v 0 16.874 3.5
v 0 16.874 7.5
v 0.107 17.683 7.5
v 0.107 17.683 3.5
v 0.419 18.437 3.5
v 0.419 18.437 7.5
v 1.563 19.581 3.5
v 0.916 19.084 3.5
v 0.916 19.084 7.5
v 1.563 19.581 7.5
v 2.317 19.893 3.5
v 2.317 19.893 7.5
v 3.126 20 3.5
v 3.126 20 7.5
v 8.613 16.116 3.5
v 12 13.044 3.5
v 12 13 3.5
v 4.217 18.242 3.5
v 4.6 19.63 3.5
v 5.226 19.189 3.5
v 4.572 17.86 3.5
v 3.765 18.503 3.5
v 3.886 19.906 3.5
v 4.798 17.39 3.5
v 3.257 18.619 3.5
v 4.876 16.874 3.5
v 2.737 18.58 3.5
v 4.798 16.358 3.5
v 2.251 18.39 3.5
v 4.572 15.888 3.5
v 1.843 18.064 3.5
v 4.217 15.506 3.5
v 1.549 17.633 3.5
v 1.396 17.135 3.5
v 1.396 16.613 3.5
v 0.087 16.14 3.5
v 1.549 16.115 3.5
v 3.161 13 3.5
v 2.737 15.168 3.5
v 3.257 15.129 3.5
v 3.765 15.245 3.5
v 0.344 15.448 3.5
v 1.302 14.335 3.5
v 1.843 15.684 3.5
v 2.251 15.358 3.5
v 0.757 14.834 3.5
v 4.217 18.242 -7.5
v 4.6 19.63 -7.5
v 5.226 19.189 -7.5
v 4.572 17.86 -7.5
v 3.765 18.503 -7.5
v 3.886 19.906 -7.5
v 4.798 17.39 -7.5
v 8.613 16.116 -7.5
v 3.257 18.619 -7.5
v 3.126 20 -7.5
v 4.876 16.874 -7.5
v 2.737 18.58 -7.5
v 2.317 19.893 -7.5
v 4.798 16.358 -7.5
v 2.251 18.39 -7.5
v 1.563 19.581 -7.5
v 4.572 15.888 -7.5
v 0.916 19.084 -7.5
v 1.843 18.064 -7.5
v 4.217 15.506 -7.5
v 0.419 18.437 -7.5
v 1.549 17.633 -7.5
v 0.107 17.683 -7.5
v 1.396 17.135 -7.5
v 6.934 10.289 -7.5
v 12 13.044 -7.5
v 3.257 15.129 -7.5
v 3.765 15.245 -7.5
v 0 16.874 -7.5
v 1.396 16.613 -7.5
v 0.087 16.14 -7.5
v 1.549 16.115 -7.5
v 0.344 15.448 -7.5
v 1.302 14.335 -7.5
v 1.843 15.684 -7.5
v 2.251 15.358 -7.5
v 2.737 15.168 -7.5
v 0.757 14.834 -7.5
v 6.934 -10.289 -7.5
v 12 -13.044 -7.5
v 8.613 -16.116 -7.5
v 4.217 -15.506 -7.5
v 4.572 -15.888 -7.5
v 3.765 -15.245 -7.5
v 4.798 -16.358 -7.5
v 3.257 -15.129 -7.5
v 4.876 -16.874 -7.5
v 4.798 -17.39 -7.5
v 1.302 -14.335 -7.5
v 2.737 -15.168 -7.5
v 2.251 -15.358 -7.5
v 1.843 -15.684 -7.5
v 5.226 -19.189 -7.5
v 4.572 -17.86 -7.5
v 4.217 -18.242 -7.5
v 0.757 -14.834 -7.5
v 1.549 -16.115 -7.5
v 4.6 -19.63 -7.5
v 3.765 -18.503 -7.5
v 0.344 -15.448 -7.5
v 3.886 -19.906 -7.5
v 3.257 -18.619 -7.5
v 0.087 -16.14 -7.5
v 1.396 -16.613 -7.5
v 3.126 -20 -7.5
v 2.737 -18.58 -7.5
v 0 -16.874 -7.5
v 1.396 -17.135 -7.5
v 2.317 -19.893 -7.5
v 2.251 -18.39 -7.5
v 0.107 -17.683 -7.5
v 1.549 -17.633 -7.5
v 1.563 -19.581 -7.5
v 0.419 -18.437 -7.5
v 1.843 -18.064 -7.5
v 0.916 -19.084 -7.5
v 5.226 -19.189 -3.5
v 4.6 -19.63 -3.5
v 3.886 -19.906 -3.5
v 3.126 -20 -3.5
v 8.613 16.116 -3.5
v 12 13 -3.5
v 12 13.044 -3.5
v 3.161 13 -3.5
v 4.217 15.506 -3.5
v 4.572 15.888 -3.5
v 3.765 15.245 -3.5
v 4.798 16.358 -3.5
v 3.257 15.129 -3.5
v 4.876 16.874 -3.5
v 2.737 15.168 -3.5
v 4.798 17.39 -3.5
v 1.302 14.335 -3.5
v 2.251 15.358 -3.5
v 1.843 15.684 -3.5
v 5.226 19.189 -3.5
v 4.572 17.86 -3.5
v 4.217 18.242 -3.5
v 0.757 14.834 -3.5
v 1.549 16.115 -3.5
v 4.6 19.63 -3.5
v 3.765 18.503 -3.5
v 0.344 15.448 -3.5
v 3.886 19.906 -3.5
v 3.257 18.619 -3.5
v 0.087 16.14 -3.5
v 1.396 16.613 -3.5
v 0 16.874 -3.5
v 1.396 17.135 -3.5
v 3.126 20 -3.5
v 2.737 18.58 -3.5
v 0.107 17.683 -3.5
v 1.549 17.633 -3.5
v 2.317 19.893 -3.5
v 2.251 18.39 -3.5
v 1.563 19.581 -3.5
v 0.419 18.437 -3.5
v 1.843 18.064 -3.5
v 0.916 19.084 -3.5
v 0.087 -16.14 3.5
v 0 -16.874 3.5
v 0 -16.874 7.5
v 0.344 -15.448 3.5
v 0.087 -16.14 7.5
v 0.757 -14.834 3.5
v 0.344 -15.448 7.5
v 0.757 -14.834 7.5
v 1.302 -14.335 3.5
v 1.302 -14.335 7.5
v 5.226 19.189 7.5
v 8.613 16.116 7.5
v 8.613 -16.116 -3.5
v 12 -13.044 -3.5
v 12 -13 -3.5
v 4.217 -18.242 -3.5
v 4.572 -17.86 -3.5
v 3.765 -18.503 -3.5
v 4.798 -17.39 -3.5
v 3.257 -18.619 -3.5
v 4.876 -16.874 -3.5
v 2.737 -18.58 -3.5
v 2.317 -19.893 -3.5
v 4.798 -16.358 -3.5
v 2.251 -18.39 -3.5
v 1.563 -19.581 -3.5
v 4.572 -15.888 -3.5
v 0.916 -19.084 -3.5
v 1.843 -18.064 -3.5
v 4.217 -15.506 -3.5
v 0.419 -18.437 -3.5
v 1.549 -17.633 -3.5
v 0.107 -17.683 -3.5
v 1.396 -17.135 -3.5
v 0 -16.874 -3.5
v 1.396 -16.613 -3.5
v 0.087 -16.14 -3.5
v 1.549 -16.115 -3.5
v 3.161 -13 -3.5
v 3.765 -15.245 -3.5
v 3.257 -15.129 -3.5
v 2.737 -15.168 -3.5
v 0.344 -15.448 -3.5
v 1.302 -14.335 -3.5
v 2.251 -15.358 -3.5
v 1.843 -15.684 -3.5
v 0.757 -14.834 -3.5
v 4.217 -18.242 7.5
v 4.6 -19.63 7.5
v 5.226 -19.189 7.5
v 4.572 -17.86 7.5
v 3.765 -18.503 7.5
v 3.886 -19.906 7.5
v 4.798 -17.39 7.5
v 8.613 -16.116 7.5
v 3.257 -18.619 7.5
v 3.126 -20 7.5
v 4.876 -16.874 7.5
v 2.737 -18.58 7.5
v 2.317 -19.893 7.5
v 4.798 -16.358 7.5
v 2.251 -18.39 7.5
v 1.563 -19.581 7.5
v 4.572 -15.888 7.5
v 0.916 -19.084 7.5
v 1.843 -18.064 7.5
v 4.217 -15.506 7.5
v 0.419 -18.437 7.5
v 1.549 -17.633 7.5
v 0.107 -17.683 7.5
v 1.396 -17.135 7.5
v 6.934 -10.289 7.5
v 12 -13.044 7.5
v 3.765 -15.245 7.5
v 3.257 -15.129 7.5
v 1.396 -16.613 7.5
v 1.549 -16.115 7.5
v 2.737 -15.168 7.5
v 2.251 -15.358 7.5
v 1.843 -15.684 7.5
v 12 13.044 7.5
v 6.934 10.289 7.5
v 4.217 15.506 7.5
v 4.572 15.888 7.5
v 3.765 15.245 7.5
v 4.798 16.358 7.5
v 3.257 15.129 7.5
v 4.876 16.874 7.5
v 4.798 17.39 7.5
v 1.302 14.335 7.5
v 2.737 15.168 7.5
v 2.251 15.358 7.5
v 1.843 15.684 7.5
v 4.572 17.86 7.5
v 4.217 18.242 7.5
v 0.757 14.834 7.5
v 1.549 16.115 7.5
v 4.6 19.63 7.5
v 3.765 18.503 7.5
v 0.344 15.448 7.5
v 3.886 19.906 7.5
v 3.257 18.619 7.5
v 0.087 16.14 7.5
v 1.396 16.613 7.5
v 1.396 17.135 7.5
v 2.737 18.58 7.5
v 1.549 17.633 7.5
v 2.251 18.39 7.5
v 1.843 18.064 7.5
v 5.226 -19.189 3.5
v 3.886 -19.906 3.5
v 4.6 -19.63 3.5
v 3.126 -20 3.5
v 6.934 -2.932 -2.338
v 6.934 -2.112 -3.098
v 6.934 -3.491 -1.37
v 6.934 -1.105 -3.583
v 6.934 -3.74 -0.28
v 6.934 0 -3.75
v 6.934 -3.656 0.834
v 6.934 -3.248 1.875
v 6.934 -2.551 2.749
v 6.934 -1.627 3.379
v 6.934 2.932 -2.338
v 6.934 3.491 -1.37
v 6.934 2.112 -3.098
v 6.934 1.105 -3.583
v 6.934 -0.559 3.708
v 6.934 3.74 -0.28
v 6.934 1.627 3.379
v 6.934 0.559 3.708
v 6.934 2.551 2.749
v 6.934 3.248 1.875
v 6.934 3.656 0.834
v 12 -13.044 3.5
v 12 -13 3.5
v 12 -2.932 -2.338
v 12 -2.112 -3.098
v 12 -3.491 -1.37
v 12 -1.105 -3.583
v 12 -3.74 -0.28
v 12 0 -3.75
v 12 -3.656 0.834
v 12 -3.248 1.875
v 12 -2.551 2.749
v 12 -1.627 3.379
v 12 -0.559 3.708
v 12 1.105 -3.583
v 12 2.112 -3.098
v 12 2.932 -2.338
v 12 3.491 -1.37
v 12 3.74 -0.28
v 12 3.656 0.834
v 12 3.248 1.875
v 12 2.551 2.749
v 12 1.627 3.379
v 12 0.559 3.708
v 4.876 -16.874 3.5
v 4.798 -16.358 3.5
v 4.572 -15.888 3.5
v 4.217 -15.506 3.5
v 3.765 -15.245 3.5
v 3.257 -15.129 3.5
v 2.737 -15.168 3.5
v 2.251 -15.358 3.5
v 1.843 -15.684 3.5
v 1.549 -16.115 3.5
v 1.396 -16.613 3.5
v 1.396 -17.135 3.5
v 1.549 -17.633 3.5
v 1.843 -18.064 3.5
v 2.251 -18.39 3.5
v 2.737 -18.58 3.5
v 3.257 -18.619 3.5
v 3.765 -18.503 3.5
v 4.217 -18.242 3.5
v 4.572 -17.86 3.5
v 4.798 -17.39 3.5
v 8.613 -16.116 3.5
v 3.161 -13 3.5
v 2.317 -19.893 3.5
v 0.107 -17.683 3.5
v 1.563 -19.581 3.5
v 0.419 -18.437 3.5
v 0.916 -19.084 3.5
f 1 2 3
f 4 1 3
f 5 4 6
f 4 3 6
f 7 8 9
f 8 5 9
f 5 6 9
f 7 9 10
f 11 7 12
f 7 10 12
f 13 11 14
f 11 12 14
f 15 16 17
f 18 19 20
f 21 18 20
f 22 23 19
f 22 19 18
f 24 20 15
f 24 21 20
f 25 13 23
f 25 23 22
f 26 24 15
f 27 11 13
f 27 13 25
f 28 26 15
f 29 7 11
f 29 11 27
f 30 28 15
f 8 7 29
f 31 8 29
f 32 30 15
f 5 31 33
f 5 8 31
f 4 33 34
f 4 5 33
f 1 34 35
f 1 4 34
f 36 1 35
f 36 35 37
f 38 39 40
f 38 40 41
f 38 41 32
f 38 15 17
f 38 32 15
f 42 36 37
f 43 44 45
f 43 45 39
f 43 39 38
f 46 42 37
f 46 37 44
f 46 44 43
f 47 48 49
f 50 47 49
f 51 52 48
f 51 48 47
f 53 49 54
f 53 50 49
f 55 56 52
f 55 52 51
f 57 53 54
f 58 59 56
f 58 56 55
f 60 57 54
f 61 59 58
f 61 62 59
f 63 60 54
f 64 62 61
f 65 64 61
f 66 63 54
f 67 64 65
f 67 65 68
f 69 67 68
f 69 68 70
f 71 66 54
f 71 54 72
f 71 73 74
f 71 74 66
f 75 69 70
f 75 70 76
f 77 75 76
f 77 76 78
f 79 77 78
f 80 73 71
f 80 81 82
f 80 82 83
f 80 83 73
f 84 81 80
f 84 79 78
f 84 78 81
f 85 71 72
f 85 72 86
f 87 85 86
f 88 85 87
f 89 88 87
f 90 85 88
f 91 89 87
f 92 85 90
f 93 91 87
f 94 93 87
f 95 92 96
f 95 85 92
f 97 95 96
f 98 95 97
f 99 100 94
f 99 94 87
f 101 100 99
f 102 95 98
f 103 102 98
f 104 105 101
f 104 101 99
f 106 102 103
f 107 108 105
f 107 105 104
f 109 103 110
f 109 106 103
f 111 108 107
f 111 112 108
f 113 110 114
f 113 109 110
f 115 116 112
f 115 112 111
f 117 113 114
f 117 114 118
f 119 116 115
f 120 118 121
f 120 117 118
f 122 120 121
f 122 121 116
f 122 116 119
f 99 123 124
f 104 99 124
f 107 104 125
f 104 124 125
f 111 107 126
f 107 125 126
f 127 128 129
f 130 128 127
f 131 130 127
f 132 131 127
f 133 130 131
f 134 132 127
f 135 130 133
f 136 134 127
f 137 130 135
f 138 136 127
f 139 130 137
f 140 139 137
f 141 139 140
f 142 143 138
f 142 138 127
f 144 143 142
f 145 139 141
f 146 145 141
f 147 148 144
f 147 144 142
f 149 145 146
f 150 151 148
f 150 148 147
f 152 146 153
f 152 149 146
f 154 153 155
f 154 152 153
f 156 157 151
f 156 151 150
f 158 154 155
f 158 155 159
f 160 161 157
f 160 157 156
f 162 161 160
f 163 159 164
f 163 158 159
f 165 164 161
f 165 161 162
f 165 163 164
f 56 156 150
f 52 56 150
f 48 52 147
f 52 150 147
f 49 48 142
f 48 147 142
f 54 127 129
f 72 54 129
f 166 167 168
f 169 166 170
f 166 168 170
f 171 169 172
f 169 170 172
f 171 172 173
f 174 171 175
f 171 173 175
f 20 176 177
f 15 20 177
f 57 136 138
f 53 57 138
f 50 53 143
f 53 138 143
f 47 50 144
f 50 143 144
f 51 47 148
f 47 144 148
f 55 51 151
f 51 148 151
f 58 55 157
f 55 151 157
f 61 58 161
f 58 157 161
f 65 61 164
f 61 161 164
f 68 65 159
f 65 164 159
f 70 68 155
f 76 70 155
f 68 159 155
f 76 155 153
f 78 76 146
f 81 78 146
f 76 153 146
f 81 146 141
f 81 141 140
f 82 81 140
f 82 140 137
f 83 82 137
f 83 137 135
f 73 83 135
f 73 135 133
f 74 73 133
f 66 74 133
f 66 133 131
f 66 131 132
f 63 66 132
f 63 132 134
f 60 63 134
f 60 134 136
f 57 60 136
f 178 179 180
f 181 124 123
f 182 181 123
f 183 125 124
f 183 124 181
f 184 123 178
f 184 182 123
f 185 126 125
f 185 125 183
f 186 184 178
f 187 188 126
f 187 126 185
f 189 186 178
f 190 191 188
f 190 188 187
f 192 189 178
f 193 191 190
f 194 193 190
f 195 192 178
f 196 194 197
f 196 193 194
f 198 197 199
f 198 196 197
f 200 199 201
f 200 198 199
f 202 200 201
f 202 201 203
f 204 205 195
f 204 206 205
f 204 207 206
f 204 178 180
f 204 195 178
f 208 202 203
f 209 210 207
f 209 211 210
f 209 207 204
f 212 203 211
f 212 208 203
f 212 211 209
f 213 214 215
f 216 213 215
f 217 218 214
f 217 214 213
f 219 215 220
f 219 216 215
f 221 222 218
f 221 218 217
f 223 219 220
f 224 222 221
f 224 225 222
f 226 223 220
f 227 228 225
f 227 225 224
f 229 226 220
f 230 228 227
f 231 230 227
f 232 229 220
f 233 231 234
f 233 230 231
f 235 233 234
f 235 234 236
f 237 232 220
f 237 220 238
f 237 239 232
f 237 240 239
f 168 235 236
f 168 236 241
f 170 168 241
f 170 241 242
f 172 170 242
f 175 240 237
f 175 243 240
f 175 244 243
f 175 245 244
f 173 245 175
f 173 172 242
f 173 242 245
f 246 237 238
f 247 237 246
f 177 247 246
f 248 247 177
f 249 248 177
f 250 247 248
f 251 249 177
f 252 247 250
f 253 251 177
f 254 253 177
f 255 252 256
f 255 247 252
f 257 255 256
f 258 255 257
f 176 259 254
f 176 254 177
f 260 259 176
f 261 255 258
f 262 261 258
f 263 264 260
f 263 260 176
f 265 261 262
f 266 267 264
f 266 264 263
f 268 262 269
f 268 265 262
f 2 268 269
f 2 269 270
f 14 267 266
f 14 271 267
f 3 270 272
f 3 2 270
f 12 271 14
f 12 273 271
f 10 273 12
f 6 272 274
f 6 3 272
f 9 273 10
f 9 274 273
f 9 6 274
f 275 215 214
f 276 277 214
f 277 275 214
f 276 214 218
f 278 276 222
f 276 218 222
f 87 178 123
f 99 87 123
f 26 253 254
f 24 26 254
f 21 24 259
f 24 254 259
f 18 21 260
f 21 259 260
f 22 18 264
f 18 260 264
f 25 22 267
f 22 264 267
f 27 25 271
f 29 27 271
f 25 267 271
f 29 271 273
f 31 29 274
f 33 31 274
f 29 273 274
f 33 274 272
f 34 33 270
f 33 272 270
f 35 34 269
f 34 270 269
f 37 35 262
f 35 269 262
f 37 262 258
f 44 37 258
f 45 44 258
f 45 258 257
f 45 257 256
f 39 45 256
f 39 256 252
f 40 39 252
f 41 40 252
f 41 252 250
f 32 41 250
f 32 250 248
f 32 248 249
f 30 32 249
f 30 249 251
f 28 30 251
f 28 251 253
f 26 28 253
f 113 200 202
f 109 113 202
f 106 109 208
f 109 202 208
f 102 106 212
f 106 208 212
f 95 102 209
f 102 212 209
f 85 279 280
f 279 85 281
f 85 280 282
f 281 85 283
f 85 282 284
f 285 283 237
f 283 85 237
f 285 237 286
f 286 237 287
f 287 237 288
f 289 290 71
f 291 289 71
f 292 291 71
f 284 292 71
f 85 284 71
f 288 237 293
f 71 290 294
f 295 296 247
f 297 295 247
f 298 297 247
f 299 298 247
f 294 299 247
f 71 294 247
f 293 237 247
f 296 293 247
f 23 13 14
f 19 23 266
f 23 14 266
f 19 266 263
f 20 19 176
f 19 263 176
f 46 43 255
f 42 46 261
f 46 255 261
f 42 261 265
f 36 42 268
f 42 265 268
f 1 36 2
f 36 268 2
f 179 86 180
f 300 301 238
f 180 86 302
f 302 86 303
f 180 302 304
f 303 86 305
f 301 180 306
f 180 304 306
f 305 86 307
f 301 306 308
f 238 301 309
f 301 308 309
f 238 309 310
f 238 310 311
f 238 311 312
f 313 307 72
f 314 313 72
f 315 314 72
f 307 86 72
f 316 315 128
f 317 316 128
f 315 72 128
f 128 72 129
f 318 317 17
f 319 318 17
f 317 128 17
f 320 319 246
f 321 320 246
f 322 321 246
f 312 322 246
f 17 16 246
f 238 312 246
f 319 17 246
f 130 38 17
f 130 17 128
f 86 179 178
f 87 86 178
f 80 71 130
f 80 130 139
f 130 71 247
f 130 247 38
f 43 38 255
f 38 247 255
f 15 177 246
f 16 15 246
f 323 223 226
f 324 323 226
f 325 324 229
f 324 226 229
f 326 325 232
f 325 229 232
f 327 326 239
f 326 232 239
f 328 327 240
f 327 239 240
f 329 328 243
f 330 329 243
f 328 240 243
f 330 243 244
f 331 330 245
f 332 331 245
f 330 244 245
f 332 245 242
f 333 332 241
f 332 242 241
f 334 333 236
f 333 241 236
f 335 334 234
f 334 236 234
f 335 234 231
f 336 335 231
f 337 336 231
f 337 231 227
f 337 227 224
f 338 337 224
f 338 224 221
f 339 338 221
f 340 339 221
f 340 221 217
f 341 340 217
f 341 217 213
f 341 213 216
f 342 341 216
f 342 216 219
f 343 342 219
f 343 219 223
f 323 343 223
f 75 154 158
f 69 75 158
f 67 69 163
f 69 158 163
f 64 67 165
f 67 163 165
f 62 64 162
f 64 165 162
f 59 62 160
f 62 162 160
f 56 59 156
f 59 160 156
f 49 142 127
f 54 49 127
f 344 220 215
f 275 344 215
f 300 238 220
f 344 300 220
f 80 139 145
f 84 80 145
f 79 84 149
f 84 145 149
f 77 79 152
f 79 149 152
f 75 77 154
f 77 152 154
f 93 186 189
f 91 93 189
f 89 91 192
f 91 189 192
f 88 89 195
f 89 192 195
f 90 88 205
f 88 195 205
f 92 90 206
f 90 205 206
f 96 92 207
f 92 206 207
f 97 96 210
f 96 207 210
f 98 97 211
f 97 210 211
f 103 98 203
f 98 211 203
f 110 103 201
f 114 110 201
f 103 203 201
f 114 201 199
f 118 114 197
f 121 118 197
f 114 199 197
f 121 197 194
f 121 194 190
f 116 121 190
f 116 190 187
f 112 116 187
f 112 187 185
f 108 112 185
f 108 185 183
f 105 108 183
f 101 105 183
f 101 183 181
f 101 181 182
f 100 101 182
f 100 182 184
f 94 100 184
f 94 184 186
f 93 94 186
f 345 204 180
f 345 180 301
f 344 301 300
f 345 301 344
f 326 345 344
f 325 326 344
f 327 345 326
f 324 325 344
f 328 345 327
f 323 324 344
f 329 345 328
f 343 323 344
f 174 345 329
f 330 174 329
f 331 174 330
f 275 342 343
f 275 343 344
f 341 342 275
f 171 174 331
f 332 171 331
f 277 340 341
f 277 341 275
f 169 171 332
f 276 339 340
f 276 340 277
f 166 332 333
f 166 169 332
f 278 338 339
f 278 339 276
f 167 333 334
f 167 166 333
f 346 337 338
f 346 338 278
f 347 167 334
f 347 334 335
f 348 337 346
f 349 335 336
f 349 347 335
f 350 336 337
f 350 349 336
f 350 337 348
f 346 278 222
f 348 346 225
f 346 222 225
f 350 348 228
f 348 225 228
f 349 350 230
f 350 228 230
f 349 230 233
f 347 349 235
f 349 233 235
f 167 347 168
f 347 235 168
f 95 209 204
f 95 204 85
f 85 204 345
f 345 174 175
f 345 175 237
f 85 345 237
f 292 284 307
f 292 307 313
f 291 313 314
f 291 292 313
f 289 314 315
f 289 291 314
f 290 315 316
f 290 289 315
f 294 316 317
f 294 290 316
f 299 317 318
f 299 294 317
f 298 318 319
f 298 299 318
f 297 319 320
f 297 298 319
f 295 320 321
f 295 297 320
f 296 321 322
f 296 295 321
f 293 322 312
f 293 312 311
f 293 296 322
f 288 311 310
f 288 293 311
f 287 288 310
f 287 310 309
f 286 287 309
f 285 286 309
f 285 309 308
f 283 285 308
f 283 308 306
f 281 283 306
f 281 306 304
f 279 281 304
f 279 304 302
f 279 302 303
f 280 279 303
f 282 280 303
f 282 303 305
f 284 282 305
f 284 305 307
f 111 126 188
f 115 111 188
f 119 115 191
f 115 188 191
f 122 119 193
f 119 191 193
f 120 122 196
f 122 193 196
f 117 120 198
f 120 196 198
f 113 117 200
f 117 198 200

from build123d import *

# Parameters (mm, degrees)
SKETCH1_R           = 3.75
BOSS_EXTRUDE1_DEPTH = 12
SKETCH2_R           = 1.75
CUT_EXTRUDE1_DEPTH  = 16


with BuildPart() as part:
    # Sketch1 → Boss-Extrude1 (new body)
    with BuildSketch(Plane(origin=(0, 0, 0), x_dir=(0, 0, -1), z_dir=(1, 0, 0))):
        Polygon((-7.5, 20), (-3.5, 20), (-3.5, 13), (3.5, 13), (3.5, 20), (7.5, 20), (7.5, -20), (3.5, -20), (3.5, -13), (-3.5, -13), (-3.5, -20), (-7.5, -20), align=None)
        Circle(SKETCH1_R, mode=Mode.SUBTRACT)
    extrude(amount=BOSS_EXTRUDE1_DEPTH)

    # Sketch2 → Cut-Extrude1 (cut, through all)
    with BuildSketch(Plane.XY.offset(7.5)):
        with BuildLine():
            ThreePointArc((1.301959033, 14.335379208), (0.344469259, 15.447503856), (0, 16.874020182))
            Line((0, 16.874020182), (0, -16.874020197))
            ThreePointArc((0, -16.874020197), (0.344469255, -15.447503862), (1.301959033, -14.335379208))
            Line((1.301959033, -14.335379208), (6.934312509, -10.288517163))
            Line((6.934312509, -10.288517163), (6.934312509, 10.288517163))
            Line((6.934312509, 10.288517163), (1.301959033, 14.335379208))
        make_face()
        with BuildLine():
            ThreePointArc((0, 16.874020182), (0.915578291, 19.084421709), (3.125979818, 20))
            Line((3.125979818, 20), (0, 20))
            Line((0, 20), (0, 16.874020182))
        make_face()
        with Locations((3.125979818, 16.874020182)):
            Circle(SKETCH2_R)
        with BuildLine():
            ThreePointArc((3.125979818, 20), (4.251738736, 19.790253486), (5.226425655, 19.189161021))
            Line((5.226425655, 19.189161021), (8.613212827, 16.116448166))
            Line((8.613212827, 16.116448166), (12, 13.043735311))
            Line((12, 13.043735311), (12, 20))
            Line((12, 20), (3.125979818, 20))
        make_face()
        with BuildLine():
            Line((12, -20), (12, -13.043735311))
            Line((12, -13.043735311), (8.613212827, -16.116448166))
            Line((8.613212827, -16.116448166), (5.226425655, -19.189161021))
            ThreePointArc((5.226425655, -19.189161021), (4.251738736, -19.790253486), (3.125979818, -20))
            Line((3.125979818, -20), (12, -20))
        make_face()
        with BuildLine():
            ThreePointArc((3.125979818, -20), (0.915578296, -19.084421715), (0, -16.874020197))
            Line((0, -16.874020197), (0, -20))
            Line((0, -20), (3.125979818, -20))
        make_face()
        with Locations((3.125979818, -16.874020182)):
            Circle(SKETCH2_R)
    extrude(amount=-CUT_EXTRUDE1_DEPTH, mode=Mode.SUBTRACT)


solid = part.part
